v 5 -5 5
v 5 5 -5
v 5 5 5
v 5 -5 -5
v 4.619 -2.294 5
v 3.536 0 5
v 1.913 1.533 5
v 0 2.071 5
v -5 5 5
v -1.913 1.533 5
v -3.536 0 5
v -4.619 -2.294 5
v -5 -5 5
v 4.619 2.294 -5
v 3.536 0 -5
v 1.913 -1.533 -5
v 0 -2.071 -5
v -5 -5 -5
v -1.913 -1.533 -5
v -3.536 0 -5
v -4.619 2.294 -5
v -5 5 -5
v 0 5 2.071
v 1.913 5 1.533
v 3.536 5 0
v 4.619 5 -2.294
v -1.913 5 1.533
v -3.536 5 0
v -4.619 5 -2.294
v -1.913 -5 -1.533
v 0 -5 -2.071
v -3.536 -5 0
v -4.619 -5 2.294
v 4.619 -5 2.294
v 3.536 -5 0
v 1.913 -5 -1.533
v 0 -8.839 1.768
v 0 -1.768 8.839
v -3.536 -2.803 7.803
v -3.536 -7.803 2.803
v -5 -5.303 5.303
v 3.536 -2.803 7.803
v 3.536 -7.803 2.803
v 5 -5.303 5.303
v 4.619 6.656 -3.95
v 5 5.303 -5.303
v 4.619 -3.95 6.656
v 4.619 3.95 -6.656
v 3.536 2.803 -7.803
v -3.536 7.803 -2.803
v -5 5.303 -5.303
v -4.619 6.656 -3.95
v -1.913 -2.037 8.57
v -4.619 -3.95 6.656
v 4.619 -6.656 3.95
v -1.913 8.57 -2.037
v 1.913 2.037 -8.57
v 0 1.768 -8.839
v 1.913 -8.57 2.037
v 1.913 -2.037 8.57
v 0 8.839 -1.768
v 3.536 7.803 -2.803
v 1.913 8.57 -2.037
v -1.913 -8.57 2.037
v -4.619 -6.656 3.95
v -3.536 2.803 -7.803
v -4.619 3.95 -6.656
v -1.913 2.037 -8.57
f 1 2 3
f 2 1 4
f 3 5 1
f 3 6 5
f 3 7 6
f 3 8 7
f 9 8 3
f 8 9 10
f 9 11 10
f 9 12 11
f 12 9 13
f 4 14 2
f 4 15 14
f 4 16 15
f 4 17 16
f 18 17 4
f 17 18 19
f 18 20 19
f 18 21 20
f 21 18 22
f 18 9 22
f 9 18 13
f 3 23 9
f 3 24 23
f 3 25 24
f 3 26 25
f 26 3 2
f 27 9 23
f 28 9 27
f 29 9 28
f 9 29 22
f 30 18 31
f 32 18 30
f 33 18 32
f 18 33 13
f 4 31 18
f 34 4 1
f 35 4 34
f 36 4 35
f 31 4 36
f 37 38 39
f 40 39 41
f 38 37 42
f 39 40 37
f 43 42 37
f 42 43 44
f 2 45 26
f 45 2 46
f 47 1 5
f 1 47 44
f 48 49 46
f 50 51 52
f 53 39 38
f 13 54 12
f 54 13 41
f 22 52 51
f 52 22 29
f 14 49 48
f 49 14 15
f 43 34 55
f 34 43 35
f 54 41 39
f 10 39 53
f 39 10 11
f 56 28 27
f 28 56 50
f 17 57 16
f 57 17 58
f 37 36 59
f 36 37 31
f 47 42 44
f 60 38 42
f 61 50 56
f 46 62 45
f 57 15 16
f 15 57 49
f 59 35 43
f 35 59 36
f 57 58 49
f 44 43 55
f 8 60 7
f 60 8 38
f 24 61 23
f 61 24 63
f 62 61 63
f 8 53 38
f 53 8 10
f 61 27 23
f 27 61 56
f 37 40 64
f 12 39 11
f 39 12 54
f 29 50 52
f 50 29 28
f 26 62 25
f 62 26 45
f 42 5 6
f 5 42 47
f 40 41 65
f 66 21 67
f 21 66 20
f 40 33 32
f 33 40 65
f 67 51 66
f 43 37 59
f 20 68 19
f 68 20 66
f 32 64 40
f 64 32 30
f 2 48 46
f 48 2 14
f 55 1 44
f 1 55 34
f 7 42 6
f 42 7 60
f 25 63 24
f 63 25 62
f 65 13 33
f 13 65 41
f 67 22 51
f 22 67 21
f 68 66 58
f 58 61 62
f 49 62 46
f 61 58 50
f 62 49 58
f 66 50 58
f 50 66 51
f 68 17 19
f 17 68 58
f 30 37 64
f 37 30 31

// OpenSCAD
// Size of the Cube (all directions)
cuSize = 10;

// The diameter of the Cylinder
cyDia = 10;

// The height of the Cylinder
cyHei = 15;

// X-Rotation of the Cylinder
rX = 45;

// Create Cube and rotate Cylinder by 'rX'
cube(size = [cuSize, cuSize, cuSize], center = true);
rotate([rX, 0, 0])
    cylinder(d = cyDia, h = cyHei, center = true);
